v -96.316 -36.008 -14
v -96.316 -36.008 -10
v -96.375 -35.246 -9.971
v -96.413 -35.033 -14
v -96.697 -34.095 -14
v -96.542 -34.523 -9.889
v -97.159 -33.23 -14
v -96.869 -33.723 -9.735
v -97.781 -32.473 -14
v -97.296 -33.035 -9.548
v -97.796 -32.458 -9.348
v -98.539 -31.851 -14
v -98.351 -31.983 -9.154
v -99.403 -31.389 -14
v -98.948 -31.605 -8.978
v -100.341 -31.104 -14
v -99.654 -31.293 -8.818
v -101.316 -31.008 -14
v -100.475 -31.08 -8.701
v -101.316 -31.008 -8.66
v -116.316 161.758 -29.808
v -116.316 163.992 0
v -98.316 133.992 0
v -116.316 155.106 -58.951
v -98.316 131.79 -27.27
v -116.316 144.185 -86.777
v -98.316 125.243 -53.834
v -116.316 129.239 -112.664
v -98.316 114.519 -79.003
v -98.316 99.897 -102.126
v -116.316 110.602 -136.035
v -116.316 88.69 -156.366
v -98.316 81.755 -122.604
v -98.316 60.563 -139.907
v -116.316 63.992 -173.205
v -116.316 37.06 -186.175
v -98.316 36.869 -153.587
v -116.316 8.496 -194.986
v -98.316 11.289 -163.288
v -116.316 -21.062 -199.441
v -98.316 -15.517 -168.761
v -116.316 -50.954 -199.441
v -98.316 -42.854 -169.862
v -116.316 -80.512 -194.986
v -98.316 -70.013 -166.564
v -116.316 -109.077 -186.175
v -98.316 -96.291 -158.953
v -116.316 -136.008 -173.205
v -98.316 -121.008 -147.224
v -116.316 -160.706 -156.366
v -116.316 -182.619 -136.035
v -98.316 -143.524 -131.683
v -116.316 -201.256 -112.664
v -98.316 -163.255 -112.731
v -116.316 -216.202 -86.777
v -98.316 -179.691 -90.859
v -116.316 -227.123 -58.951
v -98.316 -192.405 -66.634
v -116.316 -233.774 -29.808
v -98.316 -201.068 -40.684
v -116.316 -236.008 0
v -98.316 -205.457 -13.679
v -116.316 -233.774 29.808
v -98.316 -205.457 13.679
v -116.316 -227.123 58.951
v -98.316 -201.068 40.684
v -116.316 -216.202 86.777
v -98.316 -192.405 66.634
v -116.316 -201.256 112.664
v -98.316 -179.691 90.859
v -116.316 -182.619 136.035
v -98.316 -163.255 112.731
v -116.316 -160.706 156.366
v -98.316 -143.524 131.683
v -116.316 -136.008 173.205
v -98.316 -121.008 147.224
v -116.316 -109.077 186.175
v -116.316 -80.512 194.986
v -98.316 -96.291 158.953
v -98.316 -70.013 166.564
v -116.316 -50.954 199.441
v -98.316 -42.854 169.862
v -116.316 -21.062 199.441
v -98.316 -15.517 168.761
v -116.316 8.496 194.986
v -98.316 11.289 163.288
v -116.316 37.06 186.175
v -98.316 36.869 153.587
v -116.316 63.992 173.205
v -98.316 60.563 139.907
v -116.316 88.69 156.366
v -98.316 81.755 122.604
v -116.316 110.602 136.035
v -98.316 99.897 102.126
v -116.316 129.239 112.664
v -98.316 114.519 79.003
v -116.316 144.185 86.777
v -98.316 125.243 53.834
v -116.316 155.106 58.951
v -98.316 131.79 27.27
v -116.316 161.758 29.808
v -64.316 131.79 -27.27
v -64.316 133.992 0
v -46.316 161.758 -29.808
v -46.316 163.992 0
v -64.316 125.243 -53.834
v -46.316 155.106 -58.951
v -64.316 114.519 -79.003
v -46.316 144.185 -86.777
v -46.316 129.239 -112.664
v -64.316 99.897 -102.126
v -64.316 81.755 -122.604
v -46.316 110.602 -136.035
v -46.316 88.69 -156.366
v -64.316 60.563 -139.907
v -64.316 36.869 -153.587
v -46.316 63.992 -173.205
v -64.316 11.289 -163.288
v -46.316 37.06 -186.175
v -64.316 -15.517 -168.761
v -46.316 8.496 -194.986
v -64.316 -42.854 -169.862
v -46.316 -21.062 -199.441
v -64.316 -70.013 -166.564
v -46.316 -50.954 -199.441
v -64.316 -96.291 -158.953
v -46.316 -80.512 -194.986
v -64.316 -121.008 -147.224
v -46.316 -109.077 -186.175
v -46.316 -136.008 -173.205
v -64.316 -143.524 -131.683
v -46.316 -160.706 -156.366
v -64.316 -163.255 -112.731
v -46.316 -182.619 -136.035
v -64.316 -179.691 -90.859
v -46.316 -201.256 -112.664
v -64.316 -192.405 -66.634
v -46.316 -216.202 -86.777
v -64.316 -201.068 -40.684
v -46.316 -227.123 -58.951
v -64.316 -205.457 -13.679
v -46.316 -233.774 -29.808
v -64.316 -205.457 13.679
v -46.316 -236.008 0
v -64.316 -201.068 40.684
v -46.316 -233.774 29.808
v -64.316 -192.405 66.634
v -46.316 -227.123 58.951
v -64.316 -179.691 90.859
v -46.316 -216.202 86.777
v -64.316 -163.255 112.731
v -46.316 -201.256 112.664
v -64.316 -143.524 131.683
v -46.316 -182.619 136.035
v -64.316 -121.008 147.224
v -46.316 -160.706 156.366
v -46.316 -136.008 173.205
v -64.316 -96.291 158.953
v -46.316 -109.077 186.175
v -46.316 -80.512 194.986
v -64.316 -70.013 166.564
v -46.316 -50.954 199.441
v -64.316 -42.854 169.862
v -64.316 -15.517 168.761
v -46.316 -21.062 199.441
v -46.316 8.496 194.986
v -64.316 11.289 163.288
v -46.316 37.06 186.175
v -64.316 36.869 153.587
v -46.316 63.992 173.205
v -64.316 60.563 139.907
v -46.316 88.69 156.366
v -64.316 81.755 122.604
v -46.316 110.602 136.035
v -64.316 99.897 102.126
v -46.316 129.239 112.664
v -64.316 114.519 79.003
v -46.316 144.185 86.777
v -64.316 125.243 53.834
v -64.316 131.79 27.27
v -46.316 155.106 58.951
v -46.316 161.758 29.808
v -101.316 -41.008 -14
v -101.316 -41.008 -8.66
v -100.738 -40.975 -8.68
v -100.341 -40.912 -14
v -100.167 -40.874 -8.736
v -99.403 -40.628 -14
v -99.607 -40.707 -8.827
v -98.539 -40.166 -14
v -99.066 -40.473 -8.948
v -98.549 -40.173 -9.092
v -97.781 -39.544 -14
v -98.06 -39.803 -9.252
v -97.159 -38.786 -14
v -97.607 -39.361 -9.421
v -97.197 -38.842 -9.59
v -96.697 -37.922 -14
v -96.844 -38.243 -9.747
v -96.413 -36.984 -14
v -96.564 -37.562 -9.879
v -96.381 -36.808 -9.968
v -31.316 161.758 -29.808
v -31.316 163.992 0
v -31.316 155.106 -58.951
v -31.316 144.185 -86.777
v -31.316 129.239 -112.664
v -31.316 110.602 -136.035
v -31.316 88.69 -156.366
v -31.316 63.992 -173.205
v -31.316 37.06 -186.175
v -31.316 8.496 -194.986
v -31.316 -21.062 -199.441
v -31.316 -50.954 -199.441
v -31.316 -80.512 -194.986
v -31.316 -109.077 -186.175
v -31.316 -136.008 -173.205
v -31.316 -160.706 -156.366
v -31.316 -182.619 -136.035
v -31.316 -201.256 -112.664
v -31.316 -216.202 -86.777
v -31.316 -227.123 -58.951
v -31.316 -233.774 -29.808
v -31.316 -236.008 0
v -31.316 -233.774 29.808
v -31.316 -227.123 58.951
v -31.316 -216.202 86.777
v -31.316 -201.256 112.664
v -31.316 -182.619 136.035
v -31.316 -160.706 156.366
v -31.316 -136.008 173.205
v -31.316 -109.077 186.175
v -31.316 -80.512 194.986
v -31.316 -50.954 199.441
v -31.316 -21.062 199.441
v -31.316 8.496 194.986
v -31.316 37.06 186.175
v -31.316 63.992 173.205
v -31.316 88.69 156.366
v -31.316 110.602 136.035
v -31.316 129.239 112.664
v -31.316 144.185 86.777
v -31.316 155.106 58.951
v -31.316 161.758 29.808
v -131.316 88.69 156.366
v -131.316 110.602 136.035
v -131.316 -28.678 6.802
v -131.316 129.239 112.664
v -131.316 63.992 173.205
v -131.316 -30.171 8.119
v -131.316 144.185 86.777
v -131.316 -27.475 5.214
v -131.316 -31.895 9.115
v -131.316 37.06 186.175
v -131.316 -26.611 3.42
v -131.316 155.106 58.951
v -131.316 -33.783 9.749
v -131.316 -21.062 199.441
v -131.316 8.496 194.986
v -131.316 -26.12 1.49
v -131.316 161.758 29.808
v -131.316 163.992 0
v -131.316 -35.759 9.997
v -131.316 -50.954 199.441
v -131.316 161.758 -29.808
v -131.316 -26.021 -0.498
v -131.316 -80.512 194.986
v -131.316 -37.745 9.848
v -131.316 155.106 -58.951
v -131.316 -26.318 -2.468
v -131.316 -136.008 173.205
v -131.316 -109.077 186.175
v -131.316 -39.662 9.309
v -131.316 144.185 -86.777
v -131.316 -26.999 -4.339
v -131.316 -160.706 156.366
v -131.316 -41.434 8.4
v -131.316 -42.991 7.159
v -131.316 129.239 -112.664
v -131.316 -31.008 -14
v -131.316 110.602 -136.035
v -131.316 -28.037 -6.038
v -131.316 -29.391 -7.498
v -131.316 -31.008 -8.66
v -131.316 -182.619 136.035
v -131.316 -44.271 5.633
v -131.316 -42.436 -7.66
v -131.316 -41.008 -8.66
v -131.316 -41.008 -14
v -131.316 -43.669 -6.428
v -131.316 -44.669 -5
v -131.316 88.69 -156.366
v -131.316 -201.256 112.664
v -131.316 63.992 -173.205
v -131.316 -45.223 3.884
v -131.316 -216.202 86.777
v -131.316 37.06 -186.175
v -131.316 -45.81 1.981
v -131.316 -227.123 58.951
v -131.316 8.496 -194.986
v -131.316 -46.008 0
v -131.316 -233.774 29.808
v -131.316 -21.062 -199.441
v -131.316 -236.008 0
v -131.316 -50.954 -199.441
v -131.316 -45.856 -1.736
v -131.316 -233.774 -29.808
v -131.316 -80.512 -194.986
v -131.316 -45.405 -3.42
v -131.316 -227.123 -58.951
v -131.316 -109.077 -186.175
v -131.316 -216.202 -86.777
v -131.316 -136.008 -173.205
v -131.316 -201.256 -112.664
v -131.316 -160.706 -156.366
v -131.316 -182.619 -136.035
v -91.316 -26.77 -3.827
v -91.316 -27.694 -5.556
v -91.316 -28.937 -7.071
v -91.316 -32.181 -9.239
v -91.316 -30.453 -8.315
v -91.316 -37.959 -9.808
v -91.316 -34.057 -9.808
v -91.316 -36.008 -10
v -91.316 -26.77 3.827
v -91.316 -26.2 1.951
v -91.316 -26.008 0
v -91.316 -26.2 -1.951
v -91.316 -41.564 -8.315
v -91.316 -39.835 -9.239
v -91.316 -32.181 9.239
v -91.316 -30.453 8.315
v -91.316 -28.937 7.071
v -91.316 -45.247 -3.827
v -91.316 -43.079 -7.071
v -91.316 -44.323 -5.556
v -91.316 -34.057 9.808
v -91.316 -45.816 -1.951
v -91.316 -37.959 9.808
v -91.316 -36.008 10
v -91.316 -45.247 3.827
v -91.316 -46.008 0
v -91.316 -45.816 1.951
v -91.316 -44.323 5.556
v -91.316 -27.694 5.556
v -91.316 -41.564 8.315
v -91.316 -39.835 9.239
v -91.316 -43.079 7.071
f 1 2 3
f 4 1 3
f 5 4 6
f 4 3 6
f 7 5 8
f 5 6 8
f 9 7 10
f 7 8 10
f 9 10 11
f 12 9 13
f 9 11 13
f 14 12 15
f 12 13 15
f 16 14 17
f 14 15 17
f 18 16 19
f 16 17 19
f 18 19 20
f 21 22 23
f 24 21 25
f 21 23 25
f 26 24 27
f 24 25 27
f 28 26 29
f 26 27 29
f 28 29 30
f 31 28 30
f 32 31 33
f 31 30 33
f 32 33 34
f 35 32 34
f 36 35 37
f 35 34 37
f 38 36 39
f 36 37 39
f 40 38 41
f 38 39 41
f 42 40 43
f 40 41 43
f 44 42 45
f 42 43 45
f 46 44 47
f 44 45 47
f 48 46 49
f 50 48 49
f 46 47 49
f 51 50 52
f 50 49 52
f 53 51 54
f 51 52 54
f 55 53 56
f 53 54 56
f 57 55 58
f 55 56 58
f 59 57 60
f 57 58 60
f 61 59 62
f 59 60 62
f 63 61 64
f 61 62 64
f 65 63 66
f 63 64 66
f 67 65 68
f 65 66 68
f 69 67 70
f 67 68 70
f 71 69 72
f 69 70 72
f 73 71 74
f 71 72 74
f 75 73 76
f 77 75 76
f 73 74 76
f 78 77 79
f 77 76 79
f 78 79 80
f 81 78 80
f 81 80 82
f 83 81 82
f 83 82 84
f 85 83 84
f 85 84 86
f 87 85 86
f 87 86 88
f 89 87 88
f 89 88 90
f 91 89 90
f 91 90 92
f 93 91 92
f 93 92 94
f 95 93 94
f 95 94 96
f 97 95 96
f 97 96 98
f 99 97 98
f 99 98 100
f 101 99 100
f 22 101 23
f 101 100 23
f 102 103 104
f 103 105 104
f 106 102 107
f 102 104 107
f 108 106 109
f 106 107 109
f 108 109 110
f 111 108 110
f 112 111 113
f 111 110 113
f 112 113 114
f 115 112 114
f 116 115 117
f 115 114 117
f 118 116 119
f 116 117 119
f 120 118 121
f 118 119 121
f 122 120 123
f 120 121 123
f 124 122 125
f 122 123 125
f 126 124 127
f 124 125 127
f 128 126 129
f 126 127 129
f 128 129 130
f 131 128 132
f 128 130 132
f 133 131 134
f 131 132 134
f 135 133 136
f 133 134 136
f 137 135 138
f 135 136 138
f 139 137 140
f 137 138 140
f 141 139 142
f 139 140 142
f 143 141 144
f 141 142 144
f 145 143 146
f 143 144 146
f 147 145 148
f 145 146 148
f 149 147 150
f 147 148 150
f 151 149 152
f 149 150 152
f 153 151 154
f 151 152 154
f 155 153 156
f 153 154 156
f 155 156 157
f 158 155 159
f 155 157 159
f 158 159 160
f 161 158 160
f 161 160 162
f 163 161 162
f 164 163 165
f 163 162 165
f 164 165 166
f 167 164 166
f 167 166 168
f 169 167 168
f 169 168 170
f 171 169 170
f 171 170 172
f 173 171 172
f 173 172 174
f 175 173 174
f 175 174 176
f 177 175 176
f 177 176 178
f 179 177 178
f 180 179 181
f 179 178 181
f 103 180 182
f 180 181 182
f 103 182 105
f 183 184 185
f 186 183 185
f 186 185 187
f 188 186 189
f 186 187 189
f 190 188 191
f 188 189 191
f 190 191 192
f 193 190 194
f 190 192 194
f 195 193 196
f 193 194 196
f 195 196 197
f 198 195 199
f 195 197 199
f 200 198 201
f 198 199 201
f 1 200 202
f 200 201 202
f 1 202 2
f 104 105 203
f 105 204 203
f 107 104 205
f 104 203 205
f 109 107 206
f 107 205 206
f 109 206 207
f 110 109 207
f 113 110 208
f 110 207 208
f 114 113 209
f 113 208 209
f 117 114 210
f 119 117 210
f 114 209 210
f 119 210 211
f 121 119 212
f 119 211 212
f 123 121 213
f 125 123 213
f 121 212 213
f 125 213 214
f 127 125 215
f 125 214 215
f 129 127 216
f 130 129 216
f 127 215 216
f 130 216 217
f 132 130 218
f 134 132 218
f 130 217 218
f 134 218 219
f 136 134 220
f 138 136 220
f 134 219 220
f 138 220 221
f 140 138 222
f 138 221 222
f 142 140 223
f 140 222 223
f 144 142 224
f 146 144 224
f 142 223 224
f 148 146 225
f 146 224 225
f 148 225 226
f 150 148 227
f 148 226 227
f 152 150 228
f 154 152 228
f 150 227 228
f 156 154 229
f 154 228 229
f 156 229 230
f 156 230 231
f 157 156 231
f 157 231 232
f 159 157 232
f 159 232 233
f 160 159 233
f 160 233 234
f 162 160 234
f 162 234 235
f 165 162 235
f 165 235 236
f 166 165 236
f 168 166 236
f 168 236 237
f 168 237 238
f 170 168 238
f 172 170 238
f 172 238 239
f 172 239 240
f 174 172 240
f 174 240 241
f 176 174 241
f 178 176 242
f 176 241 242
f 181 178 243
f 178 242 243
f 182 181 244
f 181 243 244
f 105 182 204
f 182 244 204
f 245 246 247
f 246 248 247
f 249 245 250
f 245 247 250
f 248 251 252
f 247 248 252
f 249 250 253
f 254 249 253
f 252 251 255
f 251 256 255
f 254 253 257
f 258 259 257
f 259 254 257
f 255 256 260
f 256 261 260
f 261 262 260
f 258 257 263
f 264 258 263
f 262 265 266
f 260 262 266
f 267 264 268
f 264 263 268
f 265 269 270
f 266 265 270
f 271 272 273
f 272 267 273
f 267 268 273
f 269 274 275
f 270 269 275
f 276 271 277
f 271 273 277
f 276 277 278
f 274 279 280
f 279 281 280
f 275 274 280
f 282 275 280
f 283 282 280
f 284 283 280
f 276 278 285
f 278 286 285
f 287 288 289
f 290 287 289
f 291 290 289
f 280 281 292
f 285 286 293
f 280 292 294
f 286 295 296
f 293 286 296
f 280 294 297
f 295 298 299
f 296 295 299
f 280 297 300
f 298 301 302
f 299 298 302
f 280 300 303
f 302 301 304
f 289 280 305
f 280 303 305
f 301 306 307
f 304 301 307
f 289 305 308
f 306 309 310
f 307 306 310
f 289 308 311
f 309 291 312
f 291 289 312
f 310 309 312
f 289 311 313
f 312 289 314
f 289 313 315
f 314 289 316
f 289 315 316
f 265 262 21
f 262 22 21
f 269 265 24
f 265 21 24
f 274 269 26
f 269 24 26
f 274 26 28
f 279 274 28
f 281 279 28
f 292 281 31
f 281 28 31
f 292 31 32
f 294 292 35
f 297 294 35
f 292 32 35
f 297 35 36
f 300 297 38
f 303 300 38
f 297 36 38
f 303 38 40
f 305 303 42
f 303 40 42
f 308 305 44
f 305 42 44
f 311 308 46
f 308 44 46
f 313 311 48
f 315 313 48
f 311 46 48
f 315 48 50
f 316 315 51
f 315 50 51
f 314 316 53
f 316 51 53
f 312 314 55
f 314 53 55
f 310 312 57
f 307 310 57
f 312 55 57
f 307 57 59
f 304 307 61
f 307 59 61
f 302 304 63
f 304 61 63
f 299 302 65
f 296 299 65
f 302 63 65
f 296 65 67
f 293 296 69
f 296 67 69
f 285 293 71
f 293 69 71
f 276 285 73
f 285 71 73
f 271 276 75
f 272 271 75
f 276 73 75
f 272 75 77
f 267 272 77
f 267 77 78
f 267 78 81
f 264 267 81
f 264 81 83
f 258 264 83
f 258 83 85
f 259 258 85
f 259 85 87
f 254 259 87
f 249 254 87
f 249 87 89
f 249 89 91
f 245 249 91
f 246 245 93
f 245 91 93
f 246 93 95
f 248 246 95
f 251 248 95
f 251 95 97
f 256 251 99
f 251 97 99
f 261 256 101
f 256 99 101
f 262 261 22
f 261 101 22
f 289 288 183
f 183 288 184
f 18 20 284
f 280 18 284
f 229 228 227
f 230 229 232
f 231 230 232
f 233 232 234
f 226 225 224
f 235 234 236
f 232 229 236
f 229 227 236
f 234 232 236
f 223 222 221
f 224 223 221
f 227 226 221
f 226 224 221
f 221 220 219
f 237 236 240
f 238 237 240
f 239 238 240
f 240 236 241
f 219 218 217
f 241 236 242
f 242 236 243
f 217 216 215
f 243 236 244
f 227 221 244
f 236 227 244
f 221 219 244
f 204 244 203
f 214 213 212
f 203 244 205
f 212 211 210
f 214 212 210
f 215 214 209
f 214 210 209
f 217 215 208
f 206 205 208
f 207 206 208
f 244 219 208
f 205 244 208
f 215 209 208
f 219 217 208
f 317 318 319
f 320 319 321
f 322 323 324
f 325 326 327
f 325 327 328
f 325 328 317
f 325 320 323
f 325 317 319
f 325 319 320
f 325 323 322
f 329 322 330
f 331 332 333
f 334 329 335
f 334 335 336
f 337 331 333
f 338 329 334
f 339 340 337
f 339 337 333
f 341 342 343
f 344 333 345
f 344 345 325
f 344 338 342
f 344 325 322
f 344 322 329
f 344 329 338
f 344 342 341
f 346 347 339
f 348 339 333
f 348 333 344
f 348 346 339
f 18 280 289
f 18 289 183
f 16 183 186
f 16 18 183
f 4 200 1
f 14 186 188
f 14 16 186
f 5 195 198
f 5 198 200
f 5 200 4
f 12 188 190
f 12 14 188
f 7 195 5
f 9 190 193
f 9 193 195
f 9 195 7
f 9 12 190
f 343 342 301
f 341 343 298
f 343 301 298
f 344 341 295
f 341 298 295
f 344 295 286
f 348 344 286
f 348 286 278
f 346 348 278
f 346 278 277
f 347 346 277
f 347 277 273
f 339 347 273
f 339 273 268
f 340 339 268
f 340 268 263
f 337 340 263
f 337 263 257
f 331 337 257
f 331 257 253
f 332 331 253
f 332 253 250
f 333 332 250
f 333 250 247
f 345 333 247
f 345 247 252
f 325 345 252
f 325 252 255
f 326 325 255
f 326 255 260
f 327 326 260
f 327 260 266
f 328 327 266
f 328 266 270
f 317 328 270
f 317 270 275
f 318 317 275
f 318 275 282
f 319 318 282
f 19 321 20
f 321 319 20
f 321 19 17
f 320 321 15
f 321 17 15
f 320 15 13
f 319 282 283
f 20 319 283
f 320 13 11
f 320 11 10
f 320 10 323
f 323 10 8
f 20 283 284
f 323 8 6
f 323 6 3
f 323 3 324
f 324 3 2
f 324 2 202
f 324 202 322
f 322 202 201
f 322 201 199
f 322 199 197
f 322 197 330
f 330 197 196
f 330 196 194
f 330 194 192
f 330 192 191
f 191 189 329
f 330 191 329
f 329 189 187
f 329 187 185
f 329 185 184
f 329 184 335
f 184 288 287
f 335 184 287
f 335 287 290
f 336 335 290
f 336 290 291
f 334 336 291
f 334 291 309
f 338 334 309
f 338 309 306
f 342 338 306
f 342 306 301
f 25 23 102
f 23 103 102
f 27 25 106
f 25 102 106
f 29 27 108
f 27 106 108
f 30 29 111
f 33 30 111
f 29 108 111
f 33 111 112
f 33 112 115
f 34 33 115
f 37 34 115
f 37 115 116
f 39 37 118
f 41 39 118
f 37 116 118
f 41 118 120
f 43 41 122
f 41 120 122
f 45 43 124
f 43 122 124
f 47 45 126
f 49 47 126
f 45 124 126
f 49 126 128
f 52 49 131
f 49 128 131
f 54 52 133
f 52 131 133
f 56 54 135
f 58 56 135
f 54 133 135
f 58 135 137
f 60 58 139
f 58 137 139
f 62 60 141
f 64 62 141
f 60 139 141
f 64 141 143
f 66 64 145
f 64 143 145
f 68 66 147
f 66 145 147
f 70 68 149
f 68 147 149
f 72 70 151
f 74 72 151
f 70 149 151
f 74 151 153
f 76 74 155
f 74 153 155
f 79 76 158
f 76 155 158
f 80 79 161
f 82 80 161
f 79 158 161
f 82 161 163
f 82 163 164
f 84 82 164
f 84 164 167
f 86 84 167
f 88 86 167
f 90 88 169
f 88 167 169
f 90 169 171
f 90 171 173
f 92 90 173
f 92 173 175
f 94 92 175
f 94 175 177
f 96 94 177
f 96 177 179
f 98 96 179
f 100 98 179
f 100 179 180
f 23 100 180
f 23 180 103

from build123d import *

# Parameters (mm, degrees)
SKETCH_4_R          = 10
CUT_EXTRUDE_1_DEPTH = 40
CUT_EXTRUDE_5_DEPTH = 14
CUT_EXTRUDE_6_DEPTH = 14


with BuildPart() as part:
    # 草图1 → 旋转1 (revolve)
    with BuildSketch(Plane.XY):
        Polygon((-131.316498316, -36.008306789), (-131.316498316, 163.991693211), (-116.316498316, 163.991693211), (-98.316498316, 133.991693211), (-64.316498316, 133.991693211), (-46.316498316, 163.991693211), (-31.316498316, 163.991693211), (-31.316498316, -36.008306789), align=None)
    revolve(axis=Axis((-31.316498316, -36.008306789, 0), (-1, 0, 0)))

    # 草图4 → 切除-拉伸1 (cut)
    with BuildSketch(Plane.ZY.offset(131.316498316)):
        with Locations((0, -36.008306789)):
            Circle(SKETCH_4_R)
    extrude(amount=-CUT_EXTRUDE_1_DEPTH, mode=Mode.SUBTRACT)

    # 草图9 → 切除-拉伸5 (cut)
    with BuildSketch(Plane.XY):
        with BuildLine():
            Line((-101.316498316, -31.008306789), (-121.316498316, -31.008306789))
            ThreePointArc((-121.316498316, -31.008306789), (-126.316498316, -36.008306789), (-121.316498316, -41.008306789))
            Line((-121.316498316, -41.008306789), (-101.316498316, -41.008306789))
            ThreePointArc((-101.316498316, -41.008306789), (-96.316498316, -36.008306789), (-101.316498316, -31.008306789))
        make_face()
    extrude(amount=-CUT_EXTRUDE_5_DEPTH, mode=Mode.SUBTRACT)

    # 草图9<4> → 切除-拉伸6 (cut)
    with BuildSketch(Plane.XY):
        with BuildLine():
            ThreePointArc((-121.316498316, -41.008306789), (-126.316498316, -36.008306789), (-121.316498316, -31.008306789))
            Line((-121.316498316, -31.008306789), (-131.316498316, -31.008306789))
            Line((-131.316498316, -31.008306789), (-131.316498316, -41.008306789))
            Line((-131.316498316, -41.008306789), (-121.316498316, -41.008306789))
        make_face()
    extrude(amount=-CUT_EXTRUDE_6_DEPTH, mode=Mode.SUBTRACT)


solid = part.part
